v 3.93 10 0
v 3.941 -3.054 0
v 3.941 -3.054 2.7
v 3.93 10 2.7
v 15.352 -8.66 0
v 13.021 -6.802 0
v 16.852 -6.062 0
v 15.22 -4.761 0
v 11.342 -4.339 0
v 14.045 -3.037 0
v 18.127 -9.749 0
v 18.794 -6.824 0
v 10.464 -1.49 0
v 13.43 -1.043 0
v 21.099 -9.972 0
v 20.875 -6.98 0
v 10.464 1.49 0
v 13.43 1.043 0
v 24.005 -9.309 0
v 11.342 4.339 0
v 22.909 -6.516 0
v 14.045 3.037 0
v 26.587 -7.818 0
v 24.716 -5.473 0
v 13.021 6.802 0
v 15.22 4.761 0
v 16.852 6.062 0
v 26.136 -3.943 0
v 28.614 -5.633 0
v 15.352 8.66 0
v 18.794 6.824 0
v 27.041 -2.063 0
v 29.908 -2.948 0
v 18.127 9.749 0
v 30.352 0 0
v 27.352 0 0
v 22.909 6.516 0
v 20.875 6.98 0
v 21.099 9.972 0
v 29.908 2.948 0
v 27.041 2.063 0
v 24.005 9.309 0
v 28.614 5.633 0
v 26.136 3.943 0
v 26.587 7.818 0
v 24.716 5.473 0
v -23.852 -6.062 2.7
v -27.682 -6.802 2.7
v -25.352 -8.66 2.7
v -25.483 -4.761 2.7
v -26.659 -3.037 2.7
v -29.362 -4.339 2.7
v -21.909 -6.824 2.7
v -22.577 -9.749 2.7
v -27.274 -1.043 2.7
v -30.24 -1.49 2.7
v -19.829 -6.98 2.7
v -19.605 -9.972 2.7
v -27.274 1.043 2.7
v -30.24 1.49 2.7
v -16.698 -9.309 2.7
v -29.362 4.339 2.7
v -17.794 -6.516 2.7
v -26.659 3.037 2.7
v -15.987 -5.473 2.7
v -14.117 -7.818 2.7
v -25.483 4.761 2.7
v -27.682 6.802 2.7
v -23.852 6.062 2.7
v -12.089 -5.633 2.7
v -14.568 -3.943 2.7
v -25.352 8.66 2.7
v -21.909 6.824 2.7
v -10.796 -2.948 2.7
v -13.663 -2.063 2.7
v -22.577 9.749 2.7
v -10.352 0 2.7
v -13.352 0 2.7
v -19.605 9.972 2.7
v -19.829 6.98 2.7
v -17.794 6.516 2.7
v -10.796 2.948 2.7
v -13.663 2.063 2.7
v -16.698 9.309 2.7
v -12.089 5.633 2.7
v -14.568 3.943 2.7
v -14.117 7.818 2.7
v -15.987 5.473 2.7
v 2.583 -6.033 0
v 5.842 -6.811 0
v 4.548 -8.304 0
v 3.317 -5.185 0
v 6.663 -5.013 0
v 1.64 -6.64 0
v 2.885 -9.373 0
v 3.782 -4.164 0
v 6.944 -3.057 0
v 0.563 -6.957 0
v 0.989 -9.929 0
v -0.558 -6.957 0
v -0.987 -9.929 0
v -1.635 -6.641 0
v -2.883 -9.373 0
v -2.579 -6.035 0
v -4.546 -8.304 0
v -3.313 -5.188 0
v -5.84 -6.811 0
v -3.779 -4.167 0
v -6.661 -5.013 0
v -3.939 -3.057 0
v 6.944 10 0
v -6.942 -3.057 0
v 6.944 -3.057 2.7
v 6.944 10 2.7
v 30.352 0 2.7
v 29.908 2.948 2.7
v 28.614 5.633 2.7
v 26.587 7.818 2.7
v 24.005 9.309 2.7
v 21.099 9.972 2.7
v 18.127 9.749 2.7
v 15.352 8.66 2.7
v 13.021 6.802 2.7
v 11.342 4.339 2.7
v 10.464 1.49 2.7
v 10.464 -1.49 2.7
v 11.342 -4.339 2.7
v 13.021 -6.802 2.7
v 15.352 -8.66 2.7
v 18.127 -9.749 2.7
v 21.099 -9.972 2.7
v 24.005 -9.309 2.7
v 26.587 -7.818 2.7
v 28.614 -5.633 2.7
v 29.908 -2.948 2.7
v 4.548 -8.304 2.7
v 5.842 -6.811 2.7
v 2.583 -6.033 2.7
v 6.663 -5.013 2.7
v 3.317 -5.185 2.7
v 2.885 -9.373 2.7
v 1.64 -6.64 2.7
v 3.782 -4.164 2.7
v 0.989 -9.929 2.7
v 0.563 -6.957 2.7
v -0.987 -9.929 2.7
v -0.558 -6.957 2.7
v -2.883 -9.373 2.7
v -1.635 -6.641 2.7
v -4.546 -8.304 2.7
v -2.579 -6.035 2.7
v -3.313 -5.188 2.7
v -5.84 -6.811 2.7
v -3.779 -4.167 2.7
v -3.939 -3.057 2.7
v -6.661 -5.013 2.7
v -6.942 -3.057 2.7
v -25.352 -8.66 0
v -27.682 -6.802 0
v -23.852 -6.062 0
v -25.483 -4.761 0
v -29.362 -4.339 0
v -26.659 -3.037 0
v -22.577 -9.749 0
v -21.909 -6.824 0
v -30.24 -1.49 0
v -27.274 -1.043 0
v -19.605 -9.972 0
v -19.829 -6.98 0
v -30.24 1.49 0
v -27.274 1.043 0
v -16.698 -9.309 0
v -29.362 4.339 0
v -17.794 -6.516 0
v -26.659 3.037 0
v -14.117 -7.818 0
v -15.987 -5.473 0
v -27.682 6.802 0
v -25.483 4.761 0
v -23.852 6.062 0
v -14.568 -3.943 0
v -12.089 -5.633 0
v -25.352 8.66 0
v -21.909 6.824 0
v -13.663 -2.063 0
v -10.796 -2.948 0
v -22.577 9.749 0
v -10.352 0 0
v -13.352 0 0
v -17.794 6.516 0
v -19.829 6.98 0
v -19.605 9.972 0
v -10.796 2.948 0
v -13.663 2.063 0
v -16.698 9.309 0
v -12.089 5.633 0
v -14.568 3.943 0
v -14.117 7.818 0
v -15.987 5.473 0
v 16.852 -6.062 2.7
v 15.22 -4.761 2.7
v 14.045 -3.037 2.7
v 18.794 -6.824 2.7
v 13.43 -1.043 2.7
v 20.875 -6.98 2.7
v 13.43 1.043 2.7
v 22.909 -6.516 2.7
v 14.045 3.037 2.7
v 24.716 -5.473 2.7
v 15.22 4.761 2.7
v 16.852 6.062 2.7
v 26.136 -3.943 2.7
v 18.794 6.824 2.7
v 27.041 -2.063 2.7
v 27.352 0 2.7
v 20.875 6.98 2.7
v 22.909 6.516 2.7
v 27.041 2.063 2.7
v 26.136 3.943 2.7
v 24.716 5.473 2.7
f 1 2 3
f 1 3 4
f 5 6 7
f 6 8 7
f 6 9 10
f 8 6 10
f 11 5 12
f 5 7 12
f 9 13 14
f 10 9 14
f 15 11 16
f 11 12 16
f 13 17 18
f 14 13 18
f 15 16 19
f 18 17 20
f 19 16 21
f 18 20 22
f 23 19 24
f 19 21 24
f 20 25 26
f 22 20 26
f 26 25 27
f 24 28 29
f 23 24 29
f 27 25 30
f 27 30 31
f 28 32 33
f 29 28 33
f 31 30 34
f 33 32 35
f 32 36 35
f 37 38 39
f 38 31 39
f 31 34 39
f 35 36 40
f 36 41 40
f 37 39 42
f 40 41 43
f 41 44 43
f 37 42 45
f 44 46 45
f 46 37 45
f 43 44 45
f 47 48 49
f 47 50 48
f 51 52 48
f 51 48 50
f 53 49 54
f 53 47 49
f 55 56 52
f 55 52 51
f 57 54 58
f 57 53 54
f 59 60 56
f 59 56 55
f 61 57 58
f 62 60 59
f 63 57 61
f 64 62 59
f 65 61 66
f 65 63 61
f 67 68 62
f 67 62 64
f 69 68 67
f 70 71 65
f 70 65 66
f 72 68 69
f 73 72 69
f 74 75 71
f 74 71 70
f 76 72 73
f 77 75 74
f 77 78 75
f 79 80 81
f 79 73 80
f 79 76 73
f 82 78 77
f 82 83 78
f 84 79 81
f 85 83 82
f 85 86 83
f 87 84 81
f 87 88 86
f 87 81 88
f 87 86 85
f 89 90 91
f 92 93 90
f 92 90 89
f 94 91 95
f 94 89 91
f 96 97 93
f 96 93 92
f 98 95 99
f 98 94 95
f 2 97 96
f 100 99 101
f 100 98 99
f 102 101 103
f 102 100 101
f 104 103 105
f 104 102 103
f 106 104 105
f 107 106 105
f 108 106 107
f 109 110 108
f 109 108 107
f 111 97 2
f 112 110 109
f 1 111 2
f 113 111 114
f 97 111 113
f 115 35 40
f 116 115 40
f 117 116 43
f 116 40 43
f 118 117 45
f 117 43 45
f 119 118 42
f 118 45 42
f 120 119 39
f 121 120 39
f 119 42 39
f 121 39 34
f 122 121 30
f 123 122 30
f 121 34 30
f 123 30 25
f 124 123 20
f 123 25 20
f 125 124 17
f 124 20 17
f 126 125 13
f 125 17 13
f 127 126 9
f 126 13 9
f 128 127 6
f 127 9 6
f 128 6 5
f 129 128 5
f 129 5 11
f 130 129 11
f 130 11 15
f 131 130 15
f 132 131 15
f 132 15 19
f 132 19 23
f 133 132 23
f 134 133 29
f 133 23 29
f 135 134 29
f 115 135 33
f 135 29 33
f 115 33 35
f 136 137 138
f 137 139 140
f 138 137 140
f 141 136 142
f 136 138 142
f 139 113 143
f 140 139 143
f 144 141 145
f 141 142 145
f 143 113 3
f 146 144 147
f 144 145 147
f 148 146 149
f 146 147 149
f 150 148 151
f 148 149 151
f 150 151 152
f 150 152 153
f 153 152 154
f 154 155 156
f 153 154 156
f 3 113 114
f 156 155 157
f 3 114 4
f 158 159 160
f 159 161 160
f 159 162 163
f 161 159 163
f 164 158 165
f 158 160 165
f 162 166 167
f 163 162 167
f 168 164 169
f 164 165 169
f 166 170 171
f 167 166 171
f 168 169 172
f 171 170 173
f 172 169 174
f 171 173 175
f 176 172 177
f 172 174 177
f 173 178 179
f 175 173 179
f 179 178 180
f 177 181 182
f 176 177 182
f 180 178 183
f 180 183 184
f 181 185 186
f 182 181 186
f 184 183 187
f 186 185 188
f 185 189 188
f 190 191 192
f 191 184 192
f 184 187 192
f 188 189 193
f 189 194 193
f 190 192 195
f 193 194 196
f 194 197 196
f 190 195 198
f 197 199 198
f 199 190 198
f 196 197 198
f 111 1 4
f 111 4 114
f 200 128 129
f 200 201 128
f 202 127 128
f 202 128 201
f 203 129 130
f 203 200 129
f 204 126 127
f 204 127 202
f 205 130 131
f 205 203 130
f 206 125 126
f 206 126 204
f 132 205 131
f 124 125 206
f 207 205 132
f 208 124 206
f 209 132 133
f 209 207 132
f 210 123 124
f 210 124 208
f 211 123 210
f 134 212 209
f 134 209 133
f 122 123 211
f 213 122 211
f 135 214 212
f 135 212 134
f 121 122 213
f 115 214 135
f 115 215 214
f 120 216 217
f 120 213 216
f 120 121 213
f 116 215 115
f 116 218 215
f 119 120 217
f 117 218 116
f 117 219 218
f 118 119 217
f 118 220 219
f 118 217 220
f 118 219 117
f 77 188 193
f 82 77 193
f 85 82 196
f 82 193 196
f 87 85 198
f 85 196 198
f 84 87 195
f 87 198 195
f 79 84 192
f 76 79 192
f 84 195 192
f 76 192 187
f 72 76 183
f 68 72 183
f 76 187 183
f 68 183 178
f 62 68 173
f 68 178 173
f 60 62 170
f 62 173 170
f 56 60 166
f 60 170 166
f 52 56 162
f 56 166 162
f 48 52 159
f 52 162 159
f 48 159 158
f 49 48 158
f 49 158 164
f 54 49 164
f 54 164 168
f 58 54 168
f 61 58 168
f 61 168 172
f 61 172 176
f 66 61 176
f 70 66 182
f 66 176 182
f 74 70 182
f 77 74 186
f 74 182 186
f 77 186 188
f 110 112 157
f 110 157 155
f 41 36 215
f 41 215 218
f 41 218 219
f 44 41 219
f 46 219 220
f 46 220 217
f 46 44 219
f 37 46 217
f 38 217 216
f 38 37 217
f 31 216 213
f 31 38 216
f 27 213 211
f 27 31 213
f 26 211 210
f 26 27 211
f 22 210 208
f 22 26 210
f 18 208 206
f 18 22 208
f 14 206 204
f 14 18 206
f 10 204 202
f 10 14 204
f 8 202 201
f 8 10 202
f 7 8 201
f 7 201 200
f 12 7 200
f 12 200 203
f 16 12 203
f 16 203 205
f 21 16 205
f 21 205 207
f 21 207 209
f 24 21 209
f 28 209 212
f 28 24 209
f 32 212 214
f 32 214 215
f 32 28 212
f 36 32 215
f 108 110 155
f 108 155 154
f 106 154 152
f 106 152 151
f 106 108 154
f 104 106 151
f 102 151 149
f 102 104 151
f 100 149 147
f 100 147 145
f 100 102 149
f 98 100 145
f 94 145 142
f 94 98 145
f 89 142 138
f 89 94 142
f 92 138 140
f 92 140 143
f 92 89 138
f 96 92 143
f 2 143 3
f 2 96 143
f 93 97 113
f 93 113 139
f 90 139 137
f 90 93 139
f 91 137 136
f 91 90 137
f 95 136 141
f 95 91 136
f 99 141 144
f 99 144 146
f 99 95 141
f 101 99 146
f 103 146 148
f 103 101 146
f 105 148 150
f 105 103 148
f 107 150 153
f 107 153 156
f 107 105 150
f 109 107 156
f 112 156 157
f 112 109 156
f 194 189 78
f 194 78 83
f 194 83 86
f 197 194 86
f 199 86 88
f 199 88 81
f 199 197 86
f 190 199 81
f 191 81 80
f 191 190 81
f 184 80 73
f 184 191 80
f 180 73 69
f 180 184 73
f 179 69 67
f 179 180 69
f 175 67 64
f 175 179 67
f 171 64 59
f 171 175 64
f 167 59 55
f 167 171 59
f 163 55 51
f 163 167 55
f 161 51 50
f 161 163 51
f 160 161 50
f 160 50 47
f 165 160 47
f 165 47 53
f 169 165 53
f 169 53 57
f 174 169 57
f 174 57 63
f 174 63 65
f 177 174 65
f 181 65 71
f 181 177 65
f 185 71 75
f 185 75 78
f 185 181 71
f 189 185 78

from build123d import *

# Parameters (mm, degrees)
SKETCH2_R             = 10
SKETCH2_R_2           = 7
BOSS_EXTRUDE1_DEPTH   = 2.7
BOSS_EXTRUDE1_2_DEPTH = 2.7
BOSS_EXTRUDE1_3_DEPTH = 2.7


with BuildPart() as part:
    # Sketch2 → Boss-Extrude1 (new body)
    with BuildSketch(Plane.XY):
        with Locations((20.351834019, 0)):
            Circle(SKETCH2_R)
        with Locations((20.351834019, 0)):
            Circle(SKETCH2_R_2, mode=Mode.SUBTRACT)
    extrude(amount=BOSS_EXTRUDE1_DEPTH)


with BuildPart() as body_2:
    # Sketch2 → Boss-Extrude1 2 (new body)
    with BuildSketch(Plane.XY):
        with Locations((-20.351834019, 0)):
            Circle(SKETCH2_R)
        with Locations((-20.351834019, 0)):
            Circle(SKETCH2_R_2, mode=Mode.SUBTRACT)
    extrude(amount=BOSS_EXTRUDE1_2_DEPTH)


with BuildPart() as body_3:
    # Sketch2 → Boss-Extrude1 3 (new body)
    with BuildSketch(Plane.XY):
        with BuildLine():
            Line((3.93040203, 10.000000001), (6.944018143, 10.000000001))
            Line((6.944018143, 10.000000001), (6.944018143, -3.056941252))
            ThreePointArc((6.944018143, -3.056941252), (0.000959328, -10.000000066), (-6.942099487, -3.056941252))
            Line((-6.942099487, -3.056941252), (-3.939040028, -3.056941252))
            ThreePointArc((-3.939040028, -3.056941252), (0.002552284, -6.996940286), (3.940957396, -3.053755339))
            Line((3.940957396, -3.053755339), (3.93040203, 10.000000001))
        make_face()
    extrude(amount=BOSS_EXTRUDE1_3_DEPTH)


solid = Compound([part.part, body_2.part, body_3.part])
